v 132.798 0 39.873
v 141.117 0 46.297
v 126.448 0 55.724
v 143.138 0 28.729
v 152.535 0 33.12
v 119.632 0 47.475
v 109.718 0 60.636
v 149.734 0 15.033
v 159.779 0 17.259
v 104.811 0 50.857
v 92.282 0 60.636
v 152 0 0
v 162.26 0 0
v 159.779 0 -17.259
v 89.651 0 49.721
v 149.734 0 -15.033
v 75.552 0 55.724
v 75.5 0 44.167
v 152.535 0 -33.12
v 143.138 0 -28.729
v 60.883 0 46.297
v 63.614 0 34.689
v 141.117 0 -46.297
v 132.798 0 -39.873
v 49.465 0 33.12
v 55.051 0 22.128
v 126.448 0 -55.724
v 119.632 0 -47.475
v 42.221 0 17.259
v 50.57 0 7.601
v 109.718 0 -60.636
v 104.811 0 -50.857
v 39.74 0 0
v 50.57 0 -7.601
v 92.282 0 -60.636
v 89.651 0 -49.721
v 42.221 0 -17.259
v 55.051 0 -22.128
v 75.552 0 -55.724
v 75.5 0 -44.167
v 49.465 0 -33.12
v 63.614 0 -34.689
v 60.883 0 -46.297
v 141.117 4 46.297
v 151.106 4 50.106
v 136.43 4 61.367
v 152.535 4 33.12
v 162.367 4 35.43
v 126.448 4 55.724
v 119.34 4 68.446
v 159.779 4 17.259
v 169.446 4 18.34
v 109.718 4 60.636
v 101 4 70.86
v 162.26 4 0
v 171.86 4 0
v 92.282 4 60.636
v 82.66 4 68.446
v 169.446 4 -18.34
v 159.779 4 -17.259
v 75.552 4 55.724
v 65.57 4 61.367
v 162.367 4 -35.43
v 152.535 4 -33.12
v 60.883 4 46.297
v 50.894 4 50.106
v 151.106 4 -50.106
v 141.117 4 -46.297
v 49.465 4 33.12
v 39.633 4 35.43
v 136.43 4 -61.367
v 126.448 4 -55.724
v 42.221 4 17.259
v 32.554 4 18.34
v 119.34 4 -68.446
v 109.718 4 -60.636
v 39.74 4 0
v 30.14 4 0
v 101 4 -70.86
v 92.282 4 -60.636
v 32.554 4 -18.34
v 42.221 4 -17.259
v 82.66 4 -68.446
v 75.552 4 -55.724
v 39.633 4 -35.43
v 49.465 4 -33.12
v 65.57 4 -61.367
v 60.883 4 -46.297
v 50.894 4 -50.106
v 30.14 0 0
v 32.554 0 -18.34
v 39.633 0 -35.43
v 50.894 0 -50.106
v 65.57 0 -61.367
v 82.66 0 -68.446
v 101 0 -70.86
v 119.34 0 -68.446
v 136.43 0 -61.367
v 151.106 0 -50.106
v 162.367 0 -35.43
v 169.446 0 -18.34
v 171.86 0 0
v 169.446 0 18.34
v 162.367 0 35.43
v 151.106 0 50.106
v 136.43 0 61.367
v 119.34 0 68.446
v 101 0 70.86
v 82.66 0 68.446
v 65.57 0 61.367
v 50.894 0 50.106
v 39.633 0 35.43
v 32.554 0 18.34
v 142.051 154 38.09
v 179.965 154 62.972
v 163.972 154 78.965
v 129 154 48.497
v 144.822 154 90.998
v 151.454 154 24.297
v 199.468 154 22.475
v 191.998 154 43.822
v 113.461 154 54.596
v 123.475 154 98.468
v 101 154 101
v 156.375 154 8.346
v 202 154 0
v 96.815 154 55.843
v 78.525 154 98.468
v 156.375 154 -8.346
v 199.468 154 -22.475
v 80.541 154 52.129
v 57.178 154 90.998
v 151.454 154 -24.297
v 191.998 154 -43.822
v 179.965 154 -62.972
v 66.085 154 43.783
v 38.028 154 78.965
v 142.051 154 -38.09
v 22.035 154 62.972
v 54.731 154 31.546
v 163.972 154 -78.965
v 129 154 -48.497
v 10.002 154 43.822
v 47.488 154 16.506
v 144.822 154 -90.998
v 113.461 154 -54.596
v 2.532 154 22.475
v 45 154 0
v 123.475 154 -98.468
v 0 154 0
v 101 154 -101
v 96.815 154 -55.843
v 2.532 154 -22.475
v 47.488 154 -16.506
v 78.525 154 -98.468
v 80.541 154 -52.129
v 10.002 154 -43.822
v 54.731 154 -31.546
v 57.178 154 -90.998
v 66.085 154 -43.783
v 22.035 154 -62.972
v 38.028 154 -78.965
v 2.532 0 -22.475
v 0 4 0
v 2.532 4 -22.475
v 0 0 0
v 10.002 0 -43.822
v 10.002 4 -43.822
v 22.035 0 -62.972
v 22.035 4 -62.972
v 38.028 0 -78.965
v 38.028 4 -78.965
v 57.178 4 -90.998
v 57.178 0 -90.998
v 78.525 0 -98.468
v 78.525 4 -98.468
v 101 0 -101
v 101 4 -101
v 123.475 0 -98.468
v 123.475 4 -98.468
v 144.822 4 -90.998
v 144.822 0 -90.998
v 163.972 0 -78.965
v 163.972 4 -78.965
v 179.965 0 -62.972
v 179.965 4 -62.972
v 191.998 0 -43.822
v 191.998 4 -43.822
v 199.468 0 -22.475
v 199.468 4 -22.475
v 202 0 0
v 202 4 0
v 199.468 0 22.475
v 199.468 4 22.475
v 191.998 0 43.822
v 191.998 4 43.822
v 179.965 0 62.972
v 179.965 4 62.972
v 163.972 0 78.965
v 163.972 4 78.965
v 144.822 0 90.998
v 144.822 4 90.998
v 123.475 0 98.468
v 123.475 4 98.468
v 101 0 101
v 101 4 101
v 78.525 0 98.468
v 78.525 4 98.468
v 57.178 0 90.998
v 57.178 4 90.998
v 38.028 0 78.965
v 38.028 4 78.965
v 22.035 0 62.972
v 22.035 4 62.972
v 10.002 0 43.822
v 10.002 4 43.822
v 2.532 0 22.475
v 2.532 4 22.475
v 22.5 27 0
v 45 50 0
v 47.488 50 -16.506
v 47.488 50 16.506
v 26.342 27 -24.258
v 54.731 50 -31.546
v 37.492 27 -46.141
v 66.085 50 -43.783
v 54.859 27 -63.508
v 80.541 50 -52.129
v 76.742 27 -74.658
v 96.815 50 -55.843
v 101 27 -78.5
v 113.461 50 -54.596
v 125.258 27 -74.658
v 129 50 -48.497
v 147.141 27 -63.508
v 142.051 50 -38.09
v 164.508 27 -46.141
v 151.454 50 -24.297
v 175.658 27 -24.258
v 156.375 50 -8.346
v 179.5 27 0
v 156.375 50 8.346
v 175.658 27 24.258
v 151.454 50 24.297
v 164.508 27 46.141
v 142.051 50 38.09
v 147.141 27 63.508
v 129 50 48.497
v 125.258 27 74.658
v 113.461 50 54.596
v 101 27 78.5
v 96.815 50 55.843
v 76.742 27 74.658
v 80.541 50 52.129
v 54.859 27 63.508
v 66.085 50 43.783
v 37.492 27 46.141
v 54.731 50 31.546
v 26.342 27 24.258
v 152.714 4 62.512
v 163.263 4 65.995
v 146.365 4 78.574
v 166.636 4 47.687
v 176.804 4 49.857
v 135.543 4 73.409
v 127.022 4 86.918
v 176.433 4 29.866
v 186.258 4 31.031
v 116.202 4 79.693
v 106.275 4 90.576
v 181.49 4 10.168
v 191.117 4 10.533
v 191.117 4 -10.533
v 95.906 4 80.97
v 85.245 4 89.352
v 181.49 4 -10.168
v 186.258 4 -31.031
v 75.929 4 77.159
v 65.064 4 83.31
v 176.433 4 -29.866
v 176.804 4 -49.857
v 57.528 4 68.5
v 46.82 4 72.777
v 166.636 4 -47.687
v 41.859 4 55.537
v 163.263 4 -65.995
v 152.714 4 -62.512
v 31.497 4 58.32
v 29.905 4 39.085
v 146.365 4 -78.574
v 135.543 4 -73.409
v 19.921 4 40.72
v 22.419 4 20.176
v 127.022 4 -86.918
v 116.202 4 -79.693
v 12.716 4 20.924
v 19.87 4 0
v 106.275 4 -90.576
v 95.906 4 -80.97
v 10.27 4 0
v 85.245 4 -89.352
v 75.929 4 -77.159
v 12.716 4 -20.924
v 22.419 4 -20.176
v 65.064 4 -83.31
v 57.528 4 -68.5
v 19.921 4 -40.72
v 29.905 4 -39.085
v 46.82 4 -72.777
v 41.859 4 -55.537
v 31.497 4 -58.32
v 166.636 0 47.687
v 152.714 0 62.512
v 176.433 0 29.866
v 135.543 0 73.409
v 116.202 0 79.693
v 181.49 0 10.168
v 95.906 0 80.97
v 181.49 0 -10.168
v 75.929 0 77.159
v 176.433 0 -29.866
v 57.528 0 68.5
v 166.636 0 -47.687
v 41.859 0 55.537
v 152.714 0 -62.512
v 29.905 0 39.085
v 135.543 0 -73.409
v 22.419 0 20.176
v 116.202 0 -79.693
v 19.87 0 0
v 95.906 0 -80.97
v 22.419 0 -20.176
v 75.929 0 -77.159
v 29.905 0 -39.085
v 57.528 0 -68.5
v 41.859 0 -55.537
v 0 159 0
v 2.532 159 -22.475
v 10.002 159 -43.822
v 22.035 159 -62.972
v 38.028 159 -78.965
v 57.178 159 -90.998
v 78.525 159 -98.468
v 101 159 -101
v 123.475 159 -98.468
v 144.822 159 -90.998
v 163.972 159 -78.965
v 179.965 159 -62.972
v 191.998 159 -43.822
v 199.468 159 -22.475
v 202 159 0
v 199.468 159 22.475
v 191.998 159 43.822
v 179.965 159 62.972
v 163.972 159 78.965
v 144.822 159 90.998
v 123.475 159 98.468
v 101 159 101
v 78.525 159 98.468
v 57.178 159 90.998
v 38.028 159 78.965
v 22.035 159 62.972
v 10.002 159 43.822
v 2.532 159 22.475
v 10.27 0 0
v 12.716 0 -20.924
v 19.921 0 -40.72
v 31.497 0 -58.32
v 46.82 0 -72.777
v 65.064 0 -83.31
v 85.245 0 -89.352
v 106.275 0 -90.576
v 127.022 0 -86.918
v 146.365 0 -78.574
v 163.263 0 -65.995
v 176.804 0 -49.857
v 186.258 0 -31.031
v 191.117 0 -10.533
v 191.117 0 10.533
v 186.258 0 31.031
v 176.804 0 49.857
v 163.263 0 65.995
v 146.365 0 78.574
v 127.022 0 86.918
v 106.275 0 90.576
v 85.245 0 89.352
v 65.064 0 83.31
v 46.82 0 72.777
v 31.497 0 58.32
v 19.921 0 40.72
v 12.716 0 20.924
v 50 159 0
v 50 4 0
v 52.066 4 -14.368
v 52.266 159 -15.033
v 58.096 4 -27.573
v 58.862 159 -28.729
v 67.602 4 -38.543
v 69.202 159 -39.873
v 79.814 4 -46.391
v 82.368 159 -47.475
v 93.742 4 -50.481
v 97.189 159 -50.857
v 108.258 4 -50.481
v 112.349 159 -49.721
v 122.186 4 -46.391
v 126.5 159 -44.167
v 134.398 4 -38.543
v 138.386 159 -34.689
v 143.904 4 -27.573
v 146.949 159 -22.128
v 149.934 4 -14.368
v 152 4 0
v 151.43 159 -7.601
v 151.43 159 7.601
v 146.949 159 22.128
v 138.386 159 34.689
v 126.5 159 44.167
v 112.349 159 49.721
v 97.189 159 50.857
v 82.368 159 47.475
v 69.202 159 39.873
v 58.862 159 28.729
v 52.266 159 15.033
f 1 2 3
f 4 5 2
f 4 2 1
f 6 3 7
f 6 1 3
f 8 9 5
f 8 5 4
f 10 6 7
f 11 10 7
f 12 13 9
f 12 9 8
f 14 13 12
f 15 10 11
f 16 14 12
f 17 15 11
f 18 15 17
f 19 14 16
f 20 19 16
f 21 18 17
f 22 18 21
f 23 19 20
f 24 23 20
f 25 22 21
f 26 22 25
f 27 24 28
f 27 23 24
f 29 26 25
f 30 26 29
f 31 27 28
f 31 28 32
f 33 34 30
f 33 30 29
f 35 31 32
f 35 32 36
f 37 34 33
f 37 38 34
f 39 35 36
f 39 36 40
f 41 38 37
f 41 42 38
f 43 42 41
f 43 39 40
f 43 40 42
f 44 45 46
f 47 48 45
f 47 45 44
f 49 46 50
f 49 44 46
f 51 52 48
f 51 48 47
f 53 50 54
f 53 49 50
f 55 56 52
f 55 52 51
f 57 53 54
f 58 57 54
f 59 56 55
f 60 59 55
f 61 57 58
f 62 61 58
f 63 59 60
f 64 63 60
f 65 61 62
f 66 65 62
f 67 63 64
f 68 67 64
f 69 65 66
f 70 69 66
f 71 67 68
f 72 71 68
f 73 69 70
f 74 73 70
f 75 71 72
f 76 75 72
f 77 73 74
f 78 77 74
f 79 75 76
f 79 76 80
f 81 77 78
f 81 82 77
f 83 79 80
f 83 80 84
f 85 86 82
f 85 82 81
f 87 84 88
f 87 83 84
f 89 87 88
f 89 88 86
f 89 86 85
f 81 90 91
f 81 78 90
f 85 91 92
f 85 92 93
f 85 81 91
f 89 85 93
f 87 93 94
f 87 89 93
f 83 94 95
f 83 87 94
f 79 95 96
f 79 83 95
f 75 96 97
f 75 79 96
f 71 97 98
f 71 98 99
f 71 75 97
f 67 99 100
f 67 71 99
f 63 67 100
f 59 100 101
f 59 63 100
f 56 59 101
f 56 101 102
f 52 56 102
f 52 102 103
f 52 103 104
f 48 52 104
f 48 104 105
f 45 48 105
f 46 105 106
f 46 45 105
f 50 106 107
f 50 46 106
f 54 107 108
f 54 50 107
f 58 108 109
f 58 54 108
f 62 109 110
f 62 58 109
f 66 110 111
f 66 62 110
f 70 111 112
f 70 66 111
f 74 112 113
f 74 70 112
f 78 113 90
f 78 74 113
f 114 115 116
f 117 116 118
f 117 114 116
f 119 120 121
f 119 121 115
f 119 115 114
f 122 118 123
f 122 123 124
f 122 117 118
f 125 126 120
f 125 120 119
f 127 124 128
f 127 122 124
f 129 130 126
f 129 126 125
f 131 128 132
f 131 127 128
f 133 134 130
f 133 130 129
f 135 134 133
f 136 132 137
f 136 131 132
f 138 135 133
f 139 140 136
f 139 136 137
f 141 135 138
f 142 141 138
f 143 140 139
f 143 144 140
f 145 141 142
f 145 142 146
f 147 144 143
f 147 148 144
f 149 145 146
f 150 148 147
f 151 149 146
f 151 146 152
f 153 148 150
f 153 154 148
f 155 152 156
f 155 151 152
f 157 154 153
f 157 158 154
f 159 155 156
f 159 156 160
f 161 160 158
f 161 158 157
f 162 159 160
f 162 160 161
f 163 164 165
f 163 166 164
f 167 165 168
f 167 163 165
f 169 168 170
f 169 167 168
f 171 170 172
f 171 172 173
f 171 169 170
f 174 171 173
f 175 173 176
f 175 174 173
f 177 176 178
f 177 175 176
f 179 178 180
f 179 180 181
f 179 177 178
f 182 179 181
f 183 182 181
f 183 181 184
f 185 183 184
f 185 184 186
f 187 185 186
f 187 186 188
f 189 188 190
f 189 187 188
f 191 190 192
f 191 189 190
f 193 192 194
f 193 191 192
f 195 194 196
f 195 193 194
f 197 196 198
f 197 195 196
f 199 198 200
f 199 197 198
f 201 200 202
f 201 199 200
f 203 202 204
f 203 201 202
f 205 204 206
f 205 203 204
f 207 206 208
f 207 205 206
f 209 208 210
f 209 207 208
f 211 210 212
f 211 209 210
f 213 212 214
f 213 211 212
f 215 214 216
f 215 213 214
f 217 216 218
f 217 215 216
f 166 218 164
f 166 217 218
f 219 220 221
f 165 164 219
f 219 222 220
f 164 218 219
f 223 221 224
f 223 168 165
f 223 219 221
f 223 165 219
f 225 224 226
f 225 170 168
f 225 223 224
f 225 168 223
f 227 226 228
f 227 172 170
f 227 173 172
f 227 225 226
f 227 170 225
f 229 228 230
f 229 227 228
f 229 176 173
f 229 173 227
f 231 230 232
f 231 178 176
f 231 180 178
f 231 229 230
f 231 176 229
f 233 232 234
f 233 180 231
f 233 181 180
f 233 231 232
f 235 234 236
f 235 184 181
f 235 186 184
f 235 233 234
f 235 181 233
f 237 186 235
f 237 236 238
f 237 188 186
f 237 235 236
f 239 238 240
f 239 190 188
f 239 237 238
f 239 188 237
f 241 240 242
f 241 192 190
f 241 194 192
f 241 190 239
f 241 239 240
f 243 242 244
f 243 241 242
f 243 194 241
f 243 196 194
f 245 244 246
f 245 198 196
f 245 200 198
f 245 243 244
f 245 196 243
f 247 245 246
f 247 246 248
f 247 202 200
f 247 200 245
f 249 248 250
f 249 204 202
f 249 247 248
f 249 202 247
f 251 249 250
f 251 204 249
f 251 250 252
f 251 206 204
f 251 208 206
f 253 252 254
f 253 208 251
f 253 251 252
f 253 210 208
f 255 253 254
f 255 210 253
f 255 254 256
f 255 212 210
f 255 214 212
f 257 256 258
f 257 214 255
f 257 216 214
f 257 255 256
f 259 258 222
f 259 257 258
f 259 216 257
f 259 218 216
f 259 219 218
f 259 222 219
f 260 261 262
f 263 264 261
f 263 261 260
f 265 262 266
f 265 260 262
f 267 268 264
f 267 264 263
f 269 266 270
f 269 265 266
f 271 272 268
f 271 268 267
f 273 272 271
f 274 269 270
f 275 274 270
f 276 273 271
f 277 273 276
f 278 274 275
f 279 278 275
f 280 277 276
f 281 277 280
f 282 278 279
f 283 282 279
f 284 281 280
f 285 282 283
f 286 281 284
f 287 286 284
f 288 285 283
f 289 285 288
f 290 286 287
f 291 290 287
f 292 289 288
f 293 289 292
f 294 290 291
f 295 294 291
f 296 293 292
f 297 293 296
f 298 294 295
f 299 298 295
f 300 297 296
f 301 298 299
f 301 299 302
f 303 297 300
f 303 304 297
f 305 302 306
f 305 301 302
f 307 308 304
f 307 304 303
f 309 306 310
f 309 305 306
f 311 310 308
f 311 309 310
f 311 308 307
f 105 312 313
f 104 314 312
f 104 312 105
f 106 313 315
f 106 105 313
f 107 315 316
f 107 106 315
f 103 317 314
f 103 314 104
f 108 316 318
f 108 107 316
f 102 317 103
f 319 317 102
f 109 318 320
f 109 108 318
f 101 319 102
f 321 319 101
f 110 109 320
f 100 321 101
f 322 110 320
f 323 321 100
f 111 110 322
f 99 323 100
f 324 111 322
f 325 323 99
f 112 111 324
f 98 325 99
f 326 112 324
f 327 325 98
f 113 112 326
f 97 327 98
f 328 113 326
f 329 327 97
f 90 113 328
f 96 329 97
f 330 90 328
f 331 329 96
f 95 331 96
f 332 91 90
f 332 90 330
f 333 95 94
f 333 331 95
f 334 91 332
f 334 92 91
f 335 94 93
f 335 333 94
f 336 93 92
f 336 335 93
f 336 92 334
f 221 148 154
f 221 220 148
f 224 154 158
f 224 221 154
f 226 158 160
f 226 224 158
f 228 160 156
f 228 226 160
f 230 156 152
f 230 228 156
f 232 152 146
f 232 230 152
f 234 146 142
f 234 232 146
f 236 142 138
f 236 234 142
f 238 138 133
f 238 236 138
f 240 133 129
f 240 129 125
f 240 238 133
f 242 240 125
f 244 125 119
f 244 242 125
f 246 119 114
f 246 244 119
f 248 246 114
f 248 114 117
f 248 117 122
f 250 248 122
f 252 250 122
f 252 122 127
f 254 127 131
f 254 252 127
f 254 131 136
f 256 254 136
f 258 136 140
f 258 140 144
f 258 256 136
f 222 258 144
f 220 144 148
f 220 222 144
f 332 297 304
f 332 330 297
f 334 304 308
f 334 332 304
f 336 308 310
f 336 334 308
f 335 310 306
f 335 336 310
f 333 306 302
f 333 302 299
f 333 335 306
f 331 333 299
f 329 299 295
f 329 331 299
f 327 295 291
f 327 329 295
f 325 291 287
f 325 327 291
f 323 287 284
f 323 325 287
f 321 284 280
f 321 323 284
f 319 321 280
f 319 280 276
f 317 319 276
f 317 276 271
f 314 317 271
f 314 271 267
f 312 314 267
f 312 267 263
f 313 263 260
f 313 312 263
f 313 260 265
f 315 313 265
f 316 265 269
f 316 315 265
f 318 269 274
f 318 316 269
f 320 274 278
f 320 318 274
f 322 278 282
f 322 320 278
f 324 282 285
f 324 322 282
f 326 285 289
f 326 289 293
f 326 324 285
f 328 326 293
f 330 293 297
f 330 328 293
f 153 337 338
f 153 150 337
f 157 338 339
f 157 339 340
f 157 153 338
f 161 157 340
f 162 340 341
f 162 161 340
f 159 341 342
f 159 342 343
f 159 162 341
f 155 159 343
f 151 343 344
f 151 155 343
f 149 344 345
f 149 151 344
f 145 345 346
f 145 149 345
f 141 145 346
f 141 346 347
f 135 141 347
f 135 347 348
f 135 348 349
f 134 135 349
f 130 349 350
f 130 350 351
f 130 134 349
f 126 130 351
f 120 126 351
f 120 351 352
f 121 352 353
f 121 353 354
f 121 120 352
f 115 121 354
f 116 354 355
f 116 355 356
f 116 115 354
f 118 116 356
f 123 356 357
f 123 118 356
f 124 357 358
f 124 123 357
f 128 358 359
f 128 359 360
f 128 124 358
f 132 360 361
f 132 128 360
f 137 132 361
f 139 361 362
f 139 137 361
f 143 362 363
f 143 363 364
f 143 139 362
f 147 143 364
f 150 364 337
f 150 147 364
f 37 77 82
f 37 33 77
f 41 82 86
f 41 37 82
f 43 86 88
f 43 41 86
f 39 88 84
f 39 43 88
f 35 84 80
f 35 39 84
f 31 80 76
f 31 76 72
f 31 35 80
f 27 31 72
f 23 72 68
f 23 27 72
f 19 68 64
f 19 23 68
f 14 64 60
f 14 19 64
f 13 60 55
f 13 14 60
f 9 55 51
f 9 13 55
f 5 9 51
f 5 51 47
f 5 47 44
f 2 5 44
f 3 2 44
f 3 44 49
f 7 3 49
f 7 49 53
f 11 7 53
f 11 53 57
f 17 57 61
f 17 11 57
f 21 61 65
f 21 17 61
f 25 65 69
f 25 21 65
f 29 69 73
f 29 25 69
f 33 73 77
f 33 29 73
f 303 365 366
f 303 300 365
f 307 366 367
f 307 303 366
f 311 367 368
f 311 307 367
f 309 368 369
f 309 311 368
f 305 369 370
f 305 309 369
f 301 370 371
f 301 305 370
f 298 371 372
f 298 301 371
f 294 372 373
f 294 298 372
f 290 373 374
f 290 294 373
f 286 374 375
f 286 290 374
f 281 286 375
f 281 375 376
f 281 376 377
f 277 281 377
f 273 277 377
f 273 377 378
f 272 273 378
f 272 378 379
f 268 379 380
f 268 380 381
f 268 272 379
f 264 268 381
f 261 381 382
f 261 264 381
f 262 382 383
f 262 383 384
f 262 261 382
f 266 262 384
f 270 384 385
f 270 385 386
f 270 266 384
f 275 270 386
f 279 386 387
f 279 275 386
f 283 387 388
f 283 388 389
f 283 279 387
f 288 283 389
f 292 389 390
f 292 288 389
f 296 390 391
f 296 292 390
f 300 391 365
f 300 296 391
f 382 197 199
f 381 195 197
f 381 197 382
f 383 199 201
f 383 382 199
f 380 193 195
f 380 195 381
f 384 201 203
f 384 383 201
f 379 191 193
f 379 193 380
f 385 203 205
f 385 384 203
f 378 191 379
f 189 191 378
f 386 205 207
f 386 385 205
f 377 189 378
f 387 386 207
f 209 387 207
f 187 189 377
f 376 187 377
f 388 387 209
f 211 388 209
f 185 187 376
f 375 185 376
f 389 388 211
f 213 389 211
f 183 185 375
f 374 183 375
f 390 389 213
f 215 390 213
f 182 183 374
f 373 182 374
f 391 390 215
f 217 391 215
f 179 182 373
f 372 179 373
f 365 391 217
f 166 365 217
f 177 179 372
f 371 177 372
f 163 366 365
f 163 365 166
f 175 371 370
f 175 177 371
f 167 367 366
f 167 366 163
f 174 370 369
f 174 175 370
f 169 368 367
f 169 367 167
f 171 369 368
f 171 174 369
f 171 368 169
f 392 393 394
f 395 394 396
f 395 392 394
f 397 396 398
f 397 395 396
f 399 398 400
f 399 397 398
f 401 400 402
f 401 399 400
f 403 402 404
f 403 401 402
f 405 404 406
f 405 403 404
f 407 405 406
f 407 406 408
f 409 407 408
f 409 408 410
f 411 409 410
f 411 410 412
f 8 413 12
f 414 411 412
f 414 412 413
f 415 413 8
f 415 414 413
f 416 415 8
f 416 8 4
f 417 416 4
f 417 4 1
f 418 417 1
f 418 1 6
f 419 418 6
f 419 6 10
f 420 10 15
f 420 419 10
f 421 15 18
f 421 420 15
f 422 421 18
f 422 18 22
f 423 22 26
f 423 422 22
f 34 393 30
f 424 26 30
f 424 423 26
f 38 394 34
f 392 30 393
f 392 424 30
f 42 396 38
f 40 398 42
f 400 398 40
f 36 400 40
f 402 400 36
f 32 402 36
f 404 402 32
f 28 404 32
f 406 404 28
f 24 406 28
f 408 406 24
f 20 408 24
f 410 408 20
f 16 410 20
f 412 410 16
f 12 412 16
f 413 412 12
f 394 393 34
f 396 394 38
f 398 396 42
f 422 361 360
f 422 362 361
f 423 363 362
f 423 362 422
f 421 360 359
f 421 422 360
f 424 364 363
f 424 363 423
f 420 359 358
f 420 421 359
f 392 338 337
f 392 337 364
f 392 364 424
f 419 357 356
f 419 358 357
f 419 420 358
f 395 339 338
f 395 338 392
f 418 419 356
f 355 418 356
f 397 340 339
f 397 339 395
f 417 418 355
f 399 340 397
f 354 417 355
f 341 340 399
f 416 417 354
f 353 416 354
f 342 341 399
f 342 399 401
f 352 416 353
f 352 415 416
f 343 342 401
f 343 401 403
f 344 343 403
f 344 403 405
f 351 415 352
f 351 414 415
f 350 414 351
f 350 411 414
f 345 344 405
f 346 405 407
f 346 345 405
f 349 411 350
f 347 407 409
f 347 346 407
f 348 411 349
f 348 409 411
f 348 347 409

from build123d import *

# Parameters (mm, degrees)
CUT_EXTRUDE1_REACH = 161
SKETCH2_R          = 51


with BuildPart() as part:
    # Sketch1 → Revolve1 (revolve)
    with BuildSketch(Plane.XY):
        Polygon((50, 159), (0, 159), (0, 154), (45, 154), (45, 50), (0, 4), (0, 0), (10.27, 0), (10.27, 4), (19.87, 4), (19.87, 0), (30.14, 0), (30.14, 4), (39.74, 4), (39.74, 0), (50, 0), (101, 0), (101, 4), (50, 4), align=None)
    revolve(axis=Axis((101, 4, 0), (0, -1, 0)))

    # Sketch2 → Cut-Extrude1 (cut, up to next)
    with BuildSketch(Plane.XZ, mode=Mode.PRIVATE) as cut_extrude1_sk1:
        with Locations((101, 0)):
            Circle(SKETCH2_R)
    cut_extrude1_tool1 = extrude(cut_extrude1_sk1.sketch, amount=-CUT_EXTRUDE1_REACH, mode=Mode.PRIVATE) & part.part
    add(cut_extrude1_tool1.solids().sort_by_distance((101, 0, 0))[0], mode=Mode.SUBTRACT)


solid = part.part
